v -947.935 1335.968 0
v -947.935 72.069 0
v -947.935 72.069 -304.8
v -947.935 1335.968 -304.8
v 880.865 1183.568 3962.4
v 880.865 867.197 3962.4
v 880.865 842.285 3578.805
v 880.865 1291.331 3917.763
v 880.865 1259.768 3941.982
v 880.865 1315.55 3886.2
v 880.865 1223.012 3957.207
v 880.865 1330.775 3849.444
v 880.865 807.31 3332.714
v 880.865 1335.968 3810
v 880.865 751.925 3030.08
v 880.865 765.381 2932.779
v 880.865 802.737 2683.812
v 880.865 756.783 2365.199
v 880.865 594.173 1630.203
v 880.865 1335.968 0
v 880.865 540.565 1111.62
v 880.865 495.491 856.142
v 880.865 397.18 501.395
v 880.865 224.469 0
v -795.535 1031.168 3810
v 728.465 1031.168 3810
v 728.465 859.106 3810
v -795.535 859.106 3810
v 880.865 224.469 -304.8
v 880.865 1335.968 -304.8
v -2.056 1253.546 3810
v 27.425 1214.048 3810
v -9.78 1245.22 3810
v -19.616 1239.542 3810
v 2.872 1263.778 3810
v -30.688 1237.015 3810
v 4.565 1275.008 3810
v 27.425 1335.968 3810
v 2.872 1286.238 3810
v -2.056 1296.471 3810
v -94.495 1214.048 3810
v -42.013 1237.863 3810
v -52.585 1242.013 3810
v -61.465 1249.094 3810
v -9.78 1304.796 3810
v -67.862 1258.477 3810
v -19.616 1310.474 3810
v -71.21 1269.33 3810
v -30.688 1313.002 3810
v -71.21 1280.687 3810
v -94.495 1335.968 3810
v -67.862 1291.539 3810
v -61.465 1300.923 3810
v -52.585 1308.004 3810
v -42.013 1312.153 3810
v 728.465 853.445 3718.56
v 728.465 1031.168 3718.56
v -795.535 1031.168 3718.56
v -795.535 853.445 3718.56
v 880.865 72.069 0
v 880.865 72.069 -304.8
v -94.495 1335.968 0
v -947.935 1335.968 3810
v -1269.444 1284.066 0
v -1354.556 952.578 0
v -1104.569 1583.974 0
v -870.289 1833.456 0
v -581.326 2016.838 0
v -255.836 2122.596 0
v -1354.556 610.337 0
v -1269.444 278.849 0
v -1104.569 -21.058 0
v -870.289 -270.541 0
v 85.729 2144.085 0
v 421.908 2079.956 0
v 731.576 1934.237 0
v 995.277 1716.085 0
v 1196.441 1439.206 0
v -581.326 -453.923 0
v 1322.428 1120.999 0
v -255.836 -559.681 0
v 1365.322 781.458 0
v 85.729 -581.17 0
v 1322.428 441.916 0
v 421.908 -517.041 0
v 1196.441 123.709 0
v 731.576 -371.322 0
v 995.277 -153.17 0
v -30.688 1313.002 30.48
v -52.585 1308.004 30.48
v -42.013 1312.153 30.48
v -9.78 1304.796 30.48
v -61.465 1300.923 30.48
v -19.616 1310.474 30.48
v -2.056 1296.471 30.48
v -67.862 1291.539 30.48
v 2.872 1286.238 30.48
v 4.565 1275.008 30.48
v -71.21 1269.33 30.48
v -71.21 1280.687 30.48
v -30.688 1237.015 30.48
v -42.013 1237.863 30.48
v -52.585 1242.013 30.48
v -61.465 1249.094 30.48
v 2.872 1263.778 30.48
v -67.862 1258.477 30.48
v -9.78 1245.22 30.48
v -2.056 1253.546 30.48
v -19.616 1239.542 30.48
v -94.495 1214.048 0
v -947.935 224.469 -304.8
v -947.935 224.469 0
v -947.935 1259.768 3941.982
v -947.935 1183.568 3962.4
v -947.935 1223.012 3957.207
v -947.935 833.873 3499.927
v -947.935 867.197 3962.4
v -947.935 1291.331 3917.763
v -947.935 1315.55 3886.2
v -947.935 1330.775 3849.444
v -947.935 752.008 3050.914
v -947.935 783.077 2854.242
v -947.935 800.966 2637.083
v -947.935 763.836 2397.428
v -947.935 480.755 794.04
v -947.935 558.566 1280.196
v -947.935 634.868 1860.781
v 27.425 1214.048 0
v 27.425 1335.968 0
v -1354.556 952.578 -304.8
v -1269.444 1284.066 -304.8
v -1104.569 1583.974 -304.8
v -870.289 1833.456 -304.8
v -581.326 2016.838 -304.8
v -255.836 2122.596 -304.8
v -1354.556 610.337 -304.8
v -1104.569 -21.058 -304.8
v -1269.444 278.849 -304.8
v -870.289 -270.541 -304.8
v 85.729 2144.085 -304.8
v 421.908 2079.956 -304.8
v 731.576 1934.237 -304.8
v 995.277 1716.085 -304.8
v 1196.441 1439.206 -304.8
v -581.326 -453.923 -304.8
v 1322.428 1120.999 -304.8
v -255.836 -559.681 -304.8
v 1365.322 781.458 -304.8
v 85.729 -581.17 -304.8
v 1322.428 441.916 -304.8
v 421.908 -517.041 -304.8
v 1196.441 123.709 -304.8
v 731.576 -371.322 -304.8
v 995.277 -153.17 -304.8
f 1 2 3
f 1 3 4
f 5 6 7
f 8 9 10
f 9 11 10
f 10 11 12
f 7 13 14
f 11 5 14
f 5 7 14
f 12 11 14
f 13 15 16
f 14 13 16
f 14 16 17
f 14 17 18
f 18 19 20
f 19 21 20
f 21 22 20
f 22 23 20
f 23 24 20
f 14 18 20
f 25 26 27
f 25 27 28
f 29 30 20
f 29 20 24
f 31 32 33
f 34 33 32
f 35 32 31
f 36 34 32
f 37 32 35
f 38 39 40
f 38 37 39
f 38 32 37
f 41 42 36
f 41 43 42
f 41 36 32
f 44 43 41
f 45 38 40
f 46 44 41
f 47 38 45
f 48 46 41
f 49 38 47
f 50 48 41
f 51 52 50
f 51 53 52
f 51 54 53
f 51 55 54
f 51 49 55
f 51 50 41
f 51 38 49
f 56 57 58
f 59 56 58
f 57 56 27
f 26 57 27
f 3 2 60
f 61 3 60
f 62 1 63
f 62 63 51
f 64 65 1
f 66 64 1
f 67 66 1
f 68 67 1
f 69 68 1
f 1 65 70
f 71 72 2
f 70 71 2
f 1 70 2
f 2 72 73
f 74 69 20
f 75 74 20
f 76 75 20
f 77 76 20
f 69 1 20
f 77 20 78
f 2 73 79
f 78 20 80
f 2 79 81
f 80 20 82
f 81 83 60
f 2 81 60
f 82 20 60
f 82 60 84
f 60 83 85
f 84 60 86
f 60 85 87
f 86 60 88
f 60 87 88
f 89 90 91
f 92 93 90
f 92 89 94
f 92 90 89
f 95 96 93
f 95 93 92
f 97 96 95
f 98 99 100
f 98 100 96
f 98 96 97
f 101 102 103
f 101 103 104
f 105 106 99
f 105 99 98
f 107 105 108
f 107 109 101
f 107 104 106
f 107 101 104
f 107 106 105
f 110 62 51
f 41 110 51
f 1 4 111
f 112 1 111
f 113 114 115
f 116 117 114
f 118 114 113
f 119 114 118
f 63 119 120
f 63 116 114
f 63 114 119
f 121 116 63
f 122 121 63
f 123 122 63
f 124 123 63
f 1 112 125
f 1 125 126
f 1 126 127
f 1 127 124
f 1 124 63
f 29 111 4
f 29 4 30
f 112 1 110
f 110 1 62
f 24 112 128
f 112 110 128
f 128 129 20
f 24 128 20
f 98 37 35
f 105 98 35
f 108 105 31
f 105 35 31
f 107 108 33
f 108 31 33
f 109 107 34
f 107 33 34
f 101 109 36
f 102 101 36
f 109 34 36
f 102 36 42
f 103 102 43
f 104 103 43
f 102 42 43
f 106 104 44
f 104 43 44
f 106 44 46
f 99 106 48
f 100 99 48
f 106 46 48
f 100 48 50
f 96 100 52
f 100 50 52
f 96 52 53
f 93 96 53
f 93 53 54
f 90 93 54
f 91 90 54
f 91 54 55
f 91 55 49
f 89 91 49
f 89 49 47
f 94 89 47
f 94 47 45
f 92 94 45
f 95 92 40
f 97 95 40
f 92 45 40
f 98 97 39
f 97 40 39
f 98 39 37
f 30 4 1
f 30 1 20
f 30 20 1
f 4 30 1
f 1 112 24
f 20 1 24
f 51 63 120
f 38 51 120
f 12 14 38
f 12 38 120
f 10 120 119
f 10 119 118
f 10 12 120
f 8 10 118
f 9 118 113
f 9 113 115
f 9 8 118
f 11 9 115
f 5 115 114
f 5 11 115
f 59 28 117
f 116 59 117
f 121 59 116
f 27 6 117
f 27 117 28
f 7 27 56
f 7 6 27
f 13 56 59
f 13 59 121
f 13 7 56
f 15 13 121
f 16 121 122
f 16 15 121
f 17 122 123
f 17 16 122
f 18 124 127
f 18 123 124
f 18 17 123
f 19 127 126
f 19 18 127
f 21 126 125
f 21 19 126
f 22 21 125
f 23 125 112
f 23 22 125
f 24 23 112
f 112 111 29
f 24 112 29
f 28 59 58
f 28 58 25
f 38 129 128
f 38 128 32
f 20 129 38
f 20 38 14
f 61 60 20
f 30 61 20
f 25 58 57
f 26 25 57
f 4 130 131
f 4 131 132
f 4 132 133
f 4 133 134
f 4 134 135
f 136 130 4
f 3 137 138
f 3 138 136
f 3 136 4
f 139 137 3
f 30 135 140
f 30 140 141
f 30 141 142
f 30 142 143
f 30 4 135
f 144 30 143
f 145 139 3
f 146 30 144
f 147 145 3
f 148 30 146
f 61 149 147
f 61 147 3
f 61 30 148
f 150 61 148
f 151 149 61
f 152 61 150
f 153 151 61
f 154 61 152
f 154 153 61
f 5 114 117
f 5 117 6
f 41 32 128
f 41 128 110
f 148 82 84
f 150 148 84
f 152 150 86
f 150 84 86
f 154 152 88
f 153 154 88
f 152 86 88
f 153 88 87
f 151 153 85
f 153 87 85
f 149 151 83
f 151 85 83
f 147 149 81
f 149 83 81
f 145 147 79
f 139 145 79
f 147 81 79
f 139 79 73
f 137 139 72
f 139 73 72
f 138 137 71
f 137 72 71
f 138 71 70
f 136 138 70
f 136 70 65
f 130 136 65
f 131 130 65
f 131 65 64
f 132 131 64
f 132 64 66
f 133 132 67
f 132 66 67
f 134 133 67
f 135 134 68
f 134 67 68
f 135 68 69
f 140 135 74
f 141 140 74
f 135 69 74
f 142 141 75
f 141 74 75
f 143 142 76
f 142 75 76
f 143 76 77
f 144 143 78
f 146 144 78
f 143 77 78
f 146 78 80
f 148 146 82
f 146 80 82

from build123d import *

# Parameters (mm, degrees)
F0_W      = 1828.8
F0_H      = 1828.8
F1_DEPTH  = 3962.4
F3_DEPTH  = 1828.801
F4_R      = 1365.3217697693
F5_DEPTH  = 304.8
F6_W      = 1828.8
F6_H      = 1111.4986732128
F8_DEPTH  = 304.8
F7_R      = 1795.3323418284
F7_W      = 1828.8
F7_H      = 1111.4986732128
F9_DEPTH  = 304.8
F10_R     = 152.4
F11_W     = 1524
F11_H     = 91.44
F12_DEPTH = 2338.3258338011
F13_W     = 1524
F13_H     = 304.8
F14_DEPTH = 91.44
F15_W     = 121.92
F15_H     = 3810
F16_DEPTH = 121.92
F17_R     = 38.1
F18_DEPTH = 3779.52
F20_W     = 1828.8
F20_H     = 152.4
F21_DEPTH = 304.801


with BuildPart() as f1:
    # F0 (on Top) → F1 (new body)
    with BuildSketch(Plane.XY):
        with Locations((-33.5353706032, 421.5680965069)):
            Rectangle(F0_W, F0_H)
    extrude(amount=F1_DEPTH)

    # F2 (on face) → F3 (cut, through all)
    with BuildSketch(Plane.YZ.offset(880.8646293968)):
        with BuildLine():
            add(Edge.make_bspline(
                [(867.1973347664, 3962.4), (855.9222409024, 3741.4983659509), (836.4214056516, 3359.4382262864), (710.3423939879, 3019.3477369058), (879.6941403278, 2674.362829819), (557.9713275543, 1745.5594696148), (573.8038971935, 976.099202154), (345.5407326385, 338.2933084374), (224.4694232941, 0)],
                knots=[0, 0, 0, 0, 0.1631985806, 0.2822598381, 0.4032777866, 0.6038791368, 0.7898968135, 1, 1, 1, 1], degree=3))
            Line((867.1973347664, 3962.4), (-492.8319034931, 3962.4))
            Line((-492.8319034931, 3962.4), (-492.8319034931, 0))
            Line((-492.8319034931, 0), (224.4694232941, 0))
        make_face()
    extrude(amount=-F3_DEPTH, mode=Mode.SUBTRACT)

    # F10
    f10_edges = [f1.edges().sort_by_distance(p)[0] for p in [
        (-33.535371, 1335.968097, 3962.4),
    ]]
    fillet(f10_edges, radius=F10_R)

    # F11 (on face) → F12 (cut, through all)
    with BuildSketch(Plane(origin=(0, 1335.9680965069, 0), x_dir=(-1, 0, 0), z_dir=(0, 1, 0))):
        with Locations((33.5353706032, 3764.28)):
            Rectangle(F11_W, F11_H)
    extrude(amount=-F12_DEPTH, mode=Mode.SUBTRACT)

    # F13 (on face) → F14 (join)
    with BuildSketch(Plane.XY.offset(3718.56)):
        with Locations((-33.5353706032, 1183.5680965069)):
            Rectangle(F13_W, F13_H)
    extrude(amount=F14_DEPTH)

    # F15 (on face) → F16 (cut)
    with BuildSketch(Plane(origin=(0, 1335.9680965069, 0), x_dir=(-1, 0, 0), z_dir=(0, 1, 0))):
        with Locations((33.5353706032, 1905)):
            Rectangle(F15_W, F15_H)
    extrude(amount=-F16_DEPTH, mode=Mode.SUBTRACT)

    # F17 (on face) → F18 (join)
    with BuildSketch(Plane(origin=(0, 0, 3810), x_dir=(1, 0, 0), z_dir=(0, 0, -1))):
        with Locations((-33.5353706032, -1275.0080965069)):
            Circle(F17_R)
    extrude(amount=F18_DEPTH)


with BuildPart() as f5:
    # F4 (on face) → F5 (new body)
    with BuildSketch(Plane(origin=(0, 0, 0), x_dir=(1, 0, 0), z_dir=(0, 0, -1))):
        with Locations((0, -781.4575433731)):
            Circle(F4_R)
        Polygon((-947.9353706032, -224.4694232941), (880.8646293968, -224.4694232941), (880.8646293968, -780.2187599005), (880.8646293968, -1335.9680965069), (-947.9353706032, -1335.9680965069), align=None, mode=Mode.SUBTRACT)
    extrude(amount=F5_DEPTH)

    # F20 (on face) → F21 (cut, through all)
    with BuildSketch(Plane.XY):
        with Locations((-33.5353706032, 148.2694232941)):
            Rectangle(F20_W, F20_H)
    extrude(amount=-F21_DEPTH, mode=Mode.SUBTRACT)


with BuildPart() as f8:
    # F6 (on face) → F8 (new body)
    with BuildSketch(Plane(origin=(0, 0, -304.8), x_dir=(1, 0, 0), z_dir=(0, 0, -1))):
        with Locations((-33.5353706032, -780.2187599005)):
            Rectangle(F6_W, F6_H)
    extrude(amount=-F8_DEPTH)


with BuildPart() as f9:
    # F7 (on face) → F9 (new body)
    with BuildSketch(Plane(origin=(0, 0, -304.8), x_dir=(1, 0, 0), z_dir=(0, 0, -1))):
        with Locations((0, -792.9756045341)):
            Circle(F7_R)
        with Locations((-33.5353706032, -780.2187599005)):
            Rectangle(F7_W, F7_H, mode=Mode.SUBTRACT)
    extrude(amount=F9_DEPTH)


solid = Compound([f1.part, f5.part, f8.part])
